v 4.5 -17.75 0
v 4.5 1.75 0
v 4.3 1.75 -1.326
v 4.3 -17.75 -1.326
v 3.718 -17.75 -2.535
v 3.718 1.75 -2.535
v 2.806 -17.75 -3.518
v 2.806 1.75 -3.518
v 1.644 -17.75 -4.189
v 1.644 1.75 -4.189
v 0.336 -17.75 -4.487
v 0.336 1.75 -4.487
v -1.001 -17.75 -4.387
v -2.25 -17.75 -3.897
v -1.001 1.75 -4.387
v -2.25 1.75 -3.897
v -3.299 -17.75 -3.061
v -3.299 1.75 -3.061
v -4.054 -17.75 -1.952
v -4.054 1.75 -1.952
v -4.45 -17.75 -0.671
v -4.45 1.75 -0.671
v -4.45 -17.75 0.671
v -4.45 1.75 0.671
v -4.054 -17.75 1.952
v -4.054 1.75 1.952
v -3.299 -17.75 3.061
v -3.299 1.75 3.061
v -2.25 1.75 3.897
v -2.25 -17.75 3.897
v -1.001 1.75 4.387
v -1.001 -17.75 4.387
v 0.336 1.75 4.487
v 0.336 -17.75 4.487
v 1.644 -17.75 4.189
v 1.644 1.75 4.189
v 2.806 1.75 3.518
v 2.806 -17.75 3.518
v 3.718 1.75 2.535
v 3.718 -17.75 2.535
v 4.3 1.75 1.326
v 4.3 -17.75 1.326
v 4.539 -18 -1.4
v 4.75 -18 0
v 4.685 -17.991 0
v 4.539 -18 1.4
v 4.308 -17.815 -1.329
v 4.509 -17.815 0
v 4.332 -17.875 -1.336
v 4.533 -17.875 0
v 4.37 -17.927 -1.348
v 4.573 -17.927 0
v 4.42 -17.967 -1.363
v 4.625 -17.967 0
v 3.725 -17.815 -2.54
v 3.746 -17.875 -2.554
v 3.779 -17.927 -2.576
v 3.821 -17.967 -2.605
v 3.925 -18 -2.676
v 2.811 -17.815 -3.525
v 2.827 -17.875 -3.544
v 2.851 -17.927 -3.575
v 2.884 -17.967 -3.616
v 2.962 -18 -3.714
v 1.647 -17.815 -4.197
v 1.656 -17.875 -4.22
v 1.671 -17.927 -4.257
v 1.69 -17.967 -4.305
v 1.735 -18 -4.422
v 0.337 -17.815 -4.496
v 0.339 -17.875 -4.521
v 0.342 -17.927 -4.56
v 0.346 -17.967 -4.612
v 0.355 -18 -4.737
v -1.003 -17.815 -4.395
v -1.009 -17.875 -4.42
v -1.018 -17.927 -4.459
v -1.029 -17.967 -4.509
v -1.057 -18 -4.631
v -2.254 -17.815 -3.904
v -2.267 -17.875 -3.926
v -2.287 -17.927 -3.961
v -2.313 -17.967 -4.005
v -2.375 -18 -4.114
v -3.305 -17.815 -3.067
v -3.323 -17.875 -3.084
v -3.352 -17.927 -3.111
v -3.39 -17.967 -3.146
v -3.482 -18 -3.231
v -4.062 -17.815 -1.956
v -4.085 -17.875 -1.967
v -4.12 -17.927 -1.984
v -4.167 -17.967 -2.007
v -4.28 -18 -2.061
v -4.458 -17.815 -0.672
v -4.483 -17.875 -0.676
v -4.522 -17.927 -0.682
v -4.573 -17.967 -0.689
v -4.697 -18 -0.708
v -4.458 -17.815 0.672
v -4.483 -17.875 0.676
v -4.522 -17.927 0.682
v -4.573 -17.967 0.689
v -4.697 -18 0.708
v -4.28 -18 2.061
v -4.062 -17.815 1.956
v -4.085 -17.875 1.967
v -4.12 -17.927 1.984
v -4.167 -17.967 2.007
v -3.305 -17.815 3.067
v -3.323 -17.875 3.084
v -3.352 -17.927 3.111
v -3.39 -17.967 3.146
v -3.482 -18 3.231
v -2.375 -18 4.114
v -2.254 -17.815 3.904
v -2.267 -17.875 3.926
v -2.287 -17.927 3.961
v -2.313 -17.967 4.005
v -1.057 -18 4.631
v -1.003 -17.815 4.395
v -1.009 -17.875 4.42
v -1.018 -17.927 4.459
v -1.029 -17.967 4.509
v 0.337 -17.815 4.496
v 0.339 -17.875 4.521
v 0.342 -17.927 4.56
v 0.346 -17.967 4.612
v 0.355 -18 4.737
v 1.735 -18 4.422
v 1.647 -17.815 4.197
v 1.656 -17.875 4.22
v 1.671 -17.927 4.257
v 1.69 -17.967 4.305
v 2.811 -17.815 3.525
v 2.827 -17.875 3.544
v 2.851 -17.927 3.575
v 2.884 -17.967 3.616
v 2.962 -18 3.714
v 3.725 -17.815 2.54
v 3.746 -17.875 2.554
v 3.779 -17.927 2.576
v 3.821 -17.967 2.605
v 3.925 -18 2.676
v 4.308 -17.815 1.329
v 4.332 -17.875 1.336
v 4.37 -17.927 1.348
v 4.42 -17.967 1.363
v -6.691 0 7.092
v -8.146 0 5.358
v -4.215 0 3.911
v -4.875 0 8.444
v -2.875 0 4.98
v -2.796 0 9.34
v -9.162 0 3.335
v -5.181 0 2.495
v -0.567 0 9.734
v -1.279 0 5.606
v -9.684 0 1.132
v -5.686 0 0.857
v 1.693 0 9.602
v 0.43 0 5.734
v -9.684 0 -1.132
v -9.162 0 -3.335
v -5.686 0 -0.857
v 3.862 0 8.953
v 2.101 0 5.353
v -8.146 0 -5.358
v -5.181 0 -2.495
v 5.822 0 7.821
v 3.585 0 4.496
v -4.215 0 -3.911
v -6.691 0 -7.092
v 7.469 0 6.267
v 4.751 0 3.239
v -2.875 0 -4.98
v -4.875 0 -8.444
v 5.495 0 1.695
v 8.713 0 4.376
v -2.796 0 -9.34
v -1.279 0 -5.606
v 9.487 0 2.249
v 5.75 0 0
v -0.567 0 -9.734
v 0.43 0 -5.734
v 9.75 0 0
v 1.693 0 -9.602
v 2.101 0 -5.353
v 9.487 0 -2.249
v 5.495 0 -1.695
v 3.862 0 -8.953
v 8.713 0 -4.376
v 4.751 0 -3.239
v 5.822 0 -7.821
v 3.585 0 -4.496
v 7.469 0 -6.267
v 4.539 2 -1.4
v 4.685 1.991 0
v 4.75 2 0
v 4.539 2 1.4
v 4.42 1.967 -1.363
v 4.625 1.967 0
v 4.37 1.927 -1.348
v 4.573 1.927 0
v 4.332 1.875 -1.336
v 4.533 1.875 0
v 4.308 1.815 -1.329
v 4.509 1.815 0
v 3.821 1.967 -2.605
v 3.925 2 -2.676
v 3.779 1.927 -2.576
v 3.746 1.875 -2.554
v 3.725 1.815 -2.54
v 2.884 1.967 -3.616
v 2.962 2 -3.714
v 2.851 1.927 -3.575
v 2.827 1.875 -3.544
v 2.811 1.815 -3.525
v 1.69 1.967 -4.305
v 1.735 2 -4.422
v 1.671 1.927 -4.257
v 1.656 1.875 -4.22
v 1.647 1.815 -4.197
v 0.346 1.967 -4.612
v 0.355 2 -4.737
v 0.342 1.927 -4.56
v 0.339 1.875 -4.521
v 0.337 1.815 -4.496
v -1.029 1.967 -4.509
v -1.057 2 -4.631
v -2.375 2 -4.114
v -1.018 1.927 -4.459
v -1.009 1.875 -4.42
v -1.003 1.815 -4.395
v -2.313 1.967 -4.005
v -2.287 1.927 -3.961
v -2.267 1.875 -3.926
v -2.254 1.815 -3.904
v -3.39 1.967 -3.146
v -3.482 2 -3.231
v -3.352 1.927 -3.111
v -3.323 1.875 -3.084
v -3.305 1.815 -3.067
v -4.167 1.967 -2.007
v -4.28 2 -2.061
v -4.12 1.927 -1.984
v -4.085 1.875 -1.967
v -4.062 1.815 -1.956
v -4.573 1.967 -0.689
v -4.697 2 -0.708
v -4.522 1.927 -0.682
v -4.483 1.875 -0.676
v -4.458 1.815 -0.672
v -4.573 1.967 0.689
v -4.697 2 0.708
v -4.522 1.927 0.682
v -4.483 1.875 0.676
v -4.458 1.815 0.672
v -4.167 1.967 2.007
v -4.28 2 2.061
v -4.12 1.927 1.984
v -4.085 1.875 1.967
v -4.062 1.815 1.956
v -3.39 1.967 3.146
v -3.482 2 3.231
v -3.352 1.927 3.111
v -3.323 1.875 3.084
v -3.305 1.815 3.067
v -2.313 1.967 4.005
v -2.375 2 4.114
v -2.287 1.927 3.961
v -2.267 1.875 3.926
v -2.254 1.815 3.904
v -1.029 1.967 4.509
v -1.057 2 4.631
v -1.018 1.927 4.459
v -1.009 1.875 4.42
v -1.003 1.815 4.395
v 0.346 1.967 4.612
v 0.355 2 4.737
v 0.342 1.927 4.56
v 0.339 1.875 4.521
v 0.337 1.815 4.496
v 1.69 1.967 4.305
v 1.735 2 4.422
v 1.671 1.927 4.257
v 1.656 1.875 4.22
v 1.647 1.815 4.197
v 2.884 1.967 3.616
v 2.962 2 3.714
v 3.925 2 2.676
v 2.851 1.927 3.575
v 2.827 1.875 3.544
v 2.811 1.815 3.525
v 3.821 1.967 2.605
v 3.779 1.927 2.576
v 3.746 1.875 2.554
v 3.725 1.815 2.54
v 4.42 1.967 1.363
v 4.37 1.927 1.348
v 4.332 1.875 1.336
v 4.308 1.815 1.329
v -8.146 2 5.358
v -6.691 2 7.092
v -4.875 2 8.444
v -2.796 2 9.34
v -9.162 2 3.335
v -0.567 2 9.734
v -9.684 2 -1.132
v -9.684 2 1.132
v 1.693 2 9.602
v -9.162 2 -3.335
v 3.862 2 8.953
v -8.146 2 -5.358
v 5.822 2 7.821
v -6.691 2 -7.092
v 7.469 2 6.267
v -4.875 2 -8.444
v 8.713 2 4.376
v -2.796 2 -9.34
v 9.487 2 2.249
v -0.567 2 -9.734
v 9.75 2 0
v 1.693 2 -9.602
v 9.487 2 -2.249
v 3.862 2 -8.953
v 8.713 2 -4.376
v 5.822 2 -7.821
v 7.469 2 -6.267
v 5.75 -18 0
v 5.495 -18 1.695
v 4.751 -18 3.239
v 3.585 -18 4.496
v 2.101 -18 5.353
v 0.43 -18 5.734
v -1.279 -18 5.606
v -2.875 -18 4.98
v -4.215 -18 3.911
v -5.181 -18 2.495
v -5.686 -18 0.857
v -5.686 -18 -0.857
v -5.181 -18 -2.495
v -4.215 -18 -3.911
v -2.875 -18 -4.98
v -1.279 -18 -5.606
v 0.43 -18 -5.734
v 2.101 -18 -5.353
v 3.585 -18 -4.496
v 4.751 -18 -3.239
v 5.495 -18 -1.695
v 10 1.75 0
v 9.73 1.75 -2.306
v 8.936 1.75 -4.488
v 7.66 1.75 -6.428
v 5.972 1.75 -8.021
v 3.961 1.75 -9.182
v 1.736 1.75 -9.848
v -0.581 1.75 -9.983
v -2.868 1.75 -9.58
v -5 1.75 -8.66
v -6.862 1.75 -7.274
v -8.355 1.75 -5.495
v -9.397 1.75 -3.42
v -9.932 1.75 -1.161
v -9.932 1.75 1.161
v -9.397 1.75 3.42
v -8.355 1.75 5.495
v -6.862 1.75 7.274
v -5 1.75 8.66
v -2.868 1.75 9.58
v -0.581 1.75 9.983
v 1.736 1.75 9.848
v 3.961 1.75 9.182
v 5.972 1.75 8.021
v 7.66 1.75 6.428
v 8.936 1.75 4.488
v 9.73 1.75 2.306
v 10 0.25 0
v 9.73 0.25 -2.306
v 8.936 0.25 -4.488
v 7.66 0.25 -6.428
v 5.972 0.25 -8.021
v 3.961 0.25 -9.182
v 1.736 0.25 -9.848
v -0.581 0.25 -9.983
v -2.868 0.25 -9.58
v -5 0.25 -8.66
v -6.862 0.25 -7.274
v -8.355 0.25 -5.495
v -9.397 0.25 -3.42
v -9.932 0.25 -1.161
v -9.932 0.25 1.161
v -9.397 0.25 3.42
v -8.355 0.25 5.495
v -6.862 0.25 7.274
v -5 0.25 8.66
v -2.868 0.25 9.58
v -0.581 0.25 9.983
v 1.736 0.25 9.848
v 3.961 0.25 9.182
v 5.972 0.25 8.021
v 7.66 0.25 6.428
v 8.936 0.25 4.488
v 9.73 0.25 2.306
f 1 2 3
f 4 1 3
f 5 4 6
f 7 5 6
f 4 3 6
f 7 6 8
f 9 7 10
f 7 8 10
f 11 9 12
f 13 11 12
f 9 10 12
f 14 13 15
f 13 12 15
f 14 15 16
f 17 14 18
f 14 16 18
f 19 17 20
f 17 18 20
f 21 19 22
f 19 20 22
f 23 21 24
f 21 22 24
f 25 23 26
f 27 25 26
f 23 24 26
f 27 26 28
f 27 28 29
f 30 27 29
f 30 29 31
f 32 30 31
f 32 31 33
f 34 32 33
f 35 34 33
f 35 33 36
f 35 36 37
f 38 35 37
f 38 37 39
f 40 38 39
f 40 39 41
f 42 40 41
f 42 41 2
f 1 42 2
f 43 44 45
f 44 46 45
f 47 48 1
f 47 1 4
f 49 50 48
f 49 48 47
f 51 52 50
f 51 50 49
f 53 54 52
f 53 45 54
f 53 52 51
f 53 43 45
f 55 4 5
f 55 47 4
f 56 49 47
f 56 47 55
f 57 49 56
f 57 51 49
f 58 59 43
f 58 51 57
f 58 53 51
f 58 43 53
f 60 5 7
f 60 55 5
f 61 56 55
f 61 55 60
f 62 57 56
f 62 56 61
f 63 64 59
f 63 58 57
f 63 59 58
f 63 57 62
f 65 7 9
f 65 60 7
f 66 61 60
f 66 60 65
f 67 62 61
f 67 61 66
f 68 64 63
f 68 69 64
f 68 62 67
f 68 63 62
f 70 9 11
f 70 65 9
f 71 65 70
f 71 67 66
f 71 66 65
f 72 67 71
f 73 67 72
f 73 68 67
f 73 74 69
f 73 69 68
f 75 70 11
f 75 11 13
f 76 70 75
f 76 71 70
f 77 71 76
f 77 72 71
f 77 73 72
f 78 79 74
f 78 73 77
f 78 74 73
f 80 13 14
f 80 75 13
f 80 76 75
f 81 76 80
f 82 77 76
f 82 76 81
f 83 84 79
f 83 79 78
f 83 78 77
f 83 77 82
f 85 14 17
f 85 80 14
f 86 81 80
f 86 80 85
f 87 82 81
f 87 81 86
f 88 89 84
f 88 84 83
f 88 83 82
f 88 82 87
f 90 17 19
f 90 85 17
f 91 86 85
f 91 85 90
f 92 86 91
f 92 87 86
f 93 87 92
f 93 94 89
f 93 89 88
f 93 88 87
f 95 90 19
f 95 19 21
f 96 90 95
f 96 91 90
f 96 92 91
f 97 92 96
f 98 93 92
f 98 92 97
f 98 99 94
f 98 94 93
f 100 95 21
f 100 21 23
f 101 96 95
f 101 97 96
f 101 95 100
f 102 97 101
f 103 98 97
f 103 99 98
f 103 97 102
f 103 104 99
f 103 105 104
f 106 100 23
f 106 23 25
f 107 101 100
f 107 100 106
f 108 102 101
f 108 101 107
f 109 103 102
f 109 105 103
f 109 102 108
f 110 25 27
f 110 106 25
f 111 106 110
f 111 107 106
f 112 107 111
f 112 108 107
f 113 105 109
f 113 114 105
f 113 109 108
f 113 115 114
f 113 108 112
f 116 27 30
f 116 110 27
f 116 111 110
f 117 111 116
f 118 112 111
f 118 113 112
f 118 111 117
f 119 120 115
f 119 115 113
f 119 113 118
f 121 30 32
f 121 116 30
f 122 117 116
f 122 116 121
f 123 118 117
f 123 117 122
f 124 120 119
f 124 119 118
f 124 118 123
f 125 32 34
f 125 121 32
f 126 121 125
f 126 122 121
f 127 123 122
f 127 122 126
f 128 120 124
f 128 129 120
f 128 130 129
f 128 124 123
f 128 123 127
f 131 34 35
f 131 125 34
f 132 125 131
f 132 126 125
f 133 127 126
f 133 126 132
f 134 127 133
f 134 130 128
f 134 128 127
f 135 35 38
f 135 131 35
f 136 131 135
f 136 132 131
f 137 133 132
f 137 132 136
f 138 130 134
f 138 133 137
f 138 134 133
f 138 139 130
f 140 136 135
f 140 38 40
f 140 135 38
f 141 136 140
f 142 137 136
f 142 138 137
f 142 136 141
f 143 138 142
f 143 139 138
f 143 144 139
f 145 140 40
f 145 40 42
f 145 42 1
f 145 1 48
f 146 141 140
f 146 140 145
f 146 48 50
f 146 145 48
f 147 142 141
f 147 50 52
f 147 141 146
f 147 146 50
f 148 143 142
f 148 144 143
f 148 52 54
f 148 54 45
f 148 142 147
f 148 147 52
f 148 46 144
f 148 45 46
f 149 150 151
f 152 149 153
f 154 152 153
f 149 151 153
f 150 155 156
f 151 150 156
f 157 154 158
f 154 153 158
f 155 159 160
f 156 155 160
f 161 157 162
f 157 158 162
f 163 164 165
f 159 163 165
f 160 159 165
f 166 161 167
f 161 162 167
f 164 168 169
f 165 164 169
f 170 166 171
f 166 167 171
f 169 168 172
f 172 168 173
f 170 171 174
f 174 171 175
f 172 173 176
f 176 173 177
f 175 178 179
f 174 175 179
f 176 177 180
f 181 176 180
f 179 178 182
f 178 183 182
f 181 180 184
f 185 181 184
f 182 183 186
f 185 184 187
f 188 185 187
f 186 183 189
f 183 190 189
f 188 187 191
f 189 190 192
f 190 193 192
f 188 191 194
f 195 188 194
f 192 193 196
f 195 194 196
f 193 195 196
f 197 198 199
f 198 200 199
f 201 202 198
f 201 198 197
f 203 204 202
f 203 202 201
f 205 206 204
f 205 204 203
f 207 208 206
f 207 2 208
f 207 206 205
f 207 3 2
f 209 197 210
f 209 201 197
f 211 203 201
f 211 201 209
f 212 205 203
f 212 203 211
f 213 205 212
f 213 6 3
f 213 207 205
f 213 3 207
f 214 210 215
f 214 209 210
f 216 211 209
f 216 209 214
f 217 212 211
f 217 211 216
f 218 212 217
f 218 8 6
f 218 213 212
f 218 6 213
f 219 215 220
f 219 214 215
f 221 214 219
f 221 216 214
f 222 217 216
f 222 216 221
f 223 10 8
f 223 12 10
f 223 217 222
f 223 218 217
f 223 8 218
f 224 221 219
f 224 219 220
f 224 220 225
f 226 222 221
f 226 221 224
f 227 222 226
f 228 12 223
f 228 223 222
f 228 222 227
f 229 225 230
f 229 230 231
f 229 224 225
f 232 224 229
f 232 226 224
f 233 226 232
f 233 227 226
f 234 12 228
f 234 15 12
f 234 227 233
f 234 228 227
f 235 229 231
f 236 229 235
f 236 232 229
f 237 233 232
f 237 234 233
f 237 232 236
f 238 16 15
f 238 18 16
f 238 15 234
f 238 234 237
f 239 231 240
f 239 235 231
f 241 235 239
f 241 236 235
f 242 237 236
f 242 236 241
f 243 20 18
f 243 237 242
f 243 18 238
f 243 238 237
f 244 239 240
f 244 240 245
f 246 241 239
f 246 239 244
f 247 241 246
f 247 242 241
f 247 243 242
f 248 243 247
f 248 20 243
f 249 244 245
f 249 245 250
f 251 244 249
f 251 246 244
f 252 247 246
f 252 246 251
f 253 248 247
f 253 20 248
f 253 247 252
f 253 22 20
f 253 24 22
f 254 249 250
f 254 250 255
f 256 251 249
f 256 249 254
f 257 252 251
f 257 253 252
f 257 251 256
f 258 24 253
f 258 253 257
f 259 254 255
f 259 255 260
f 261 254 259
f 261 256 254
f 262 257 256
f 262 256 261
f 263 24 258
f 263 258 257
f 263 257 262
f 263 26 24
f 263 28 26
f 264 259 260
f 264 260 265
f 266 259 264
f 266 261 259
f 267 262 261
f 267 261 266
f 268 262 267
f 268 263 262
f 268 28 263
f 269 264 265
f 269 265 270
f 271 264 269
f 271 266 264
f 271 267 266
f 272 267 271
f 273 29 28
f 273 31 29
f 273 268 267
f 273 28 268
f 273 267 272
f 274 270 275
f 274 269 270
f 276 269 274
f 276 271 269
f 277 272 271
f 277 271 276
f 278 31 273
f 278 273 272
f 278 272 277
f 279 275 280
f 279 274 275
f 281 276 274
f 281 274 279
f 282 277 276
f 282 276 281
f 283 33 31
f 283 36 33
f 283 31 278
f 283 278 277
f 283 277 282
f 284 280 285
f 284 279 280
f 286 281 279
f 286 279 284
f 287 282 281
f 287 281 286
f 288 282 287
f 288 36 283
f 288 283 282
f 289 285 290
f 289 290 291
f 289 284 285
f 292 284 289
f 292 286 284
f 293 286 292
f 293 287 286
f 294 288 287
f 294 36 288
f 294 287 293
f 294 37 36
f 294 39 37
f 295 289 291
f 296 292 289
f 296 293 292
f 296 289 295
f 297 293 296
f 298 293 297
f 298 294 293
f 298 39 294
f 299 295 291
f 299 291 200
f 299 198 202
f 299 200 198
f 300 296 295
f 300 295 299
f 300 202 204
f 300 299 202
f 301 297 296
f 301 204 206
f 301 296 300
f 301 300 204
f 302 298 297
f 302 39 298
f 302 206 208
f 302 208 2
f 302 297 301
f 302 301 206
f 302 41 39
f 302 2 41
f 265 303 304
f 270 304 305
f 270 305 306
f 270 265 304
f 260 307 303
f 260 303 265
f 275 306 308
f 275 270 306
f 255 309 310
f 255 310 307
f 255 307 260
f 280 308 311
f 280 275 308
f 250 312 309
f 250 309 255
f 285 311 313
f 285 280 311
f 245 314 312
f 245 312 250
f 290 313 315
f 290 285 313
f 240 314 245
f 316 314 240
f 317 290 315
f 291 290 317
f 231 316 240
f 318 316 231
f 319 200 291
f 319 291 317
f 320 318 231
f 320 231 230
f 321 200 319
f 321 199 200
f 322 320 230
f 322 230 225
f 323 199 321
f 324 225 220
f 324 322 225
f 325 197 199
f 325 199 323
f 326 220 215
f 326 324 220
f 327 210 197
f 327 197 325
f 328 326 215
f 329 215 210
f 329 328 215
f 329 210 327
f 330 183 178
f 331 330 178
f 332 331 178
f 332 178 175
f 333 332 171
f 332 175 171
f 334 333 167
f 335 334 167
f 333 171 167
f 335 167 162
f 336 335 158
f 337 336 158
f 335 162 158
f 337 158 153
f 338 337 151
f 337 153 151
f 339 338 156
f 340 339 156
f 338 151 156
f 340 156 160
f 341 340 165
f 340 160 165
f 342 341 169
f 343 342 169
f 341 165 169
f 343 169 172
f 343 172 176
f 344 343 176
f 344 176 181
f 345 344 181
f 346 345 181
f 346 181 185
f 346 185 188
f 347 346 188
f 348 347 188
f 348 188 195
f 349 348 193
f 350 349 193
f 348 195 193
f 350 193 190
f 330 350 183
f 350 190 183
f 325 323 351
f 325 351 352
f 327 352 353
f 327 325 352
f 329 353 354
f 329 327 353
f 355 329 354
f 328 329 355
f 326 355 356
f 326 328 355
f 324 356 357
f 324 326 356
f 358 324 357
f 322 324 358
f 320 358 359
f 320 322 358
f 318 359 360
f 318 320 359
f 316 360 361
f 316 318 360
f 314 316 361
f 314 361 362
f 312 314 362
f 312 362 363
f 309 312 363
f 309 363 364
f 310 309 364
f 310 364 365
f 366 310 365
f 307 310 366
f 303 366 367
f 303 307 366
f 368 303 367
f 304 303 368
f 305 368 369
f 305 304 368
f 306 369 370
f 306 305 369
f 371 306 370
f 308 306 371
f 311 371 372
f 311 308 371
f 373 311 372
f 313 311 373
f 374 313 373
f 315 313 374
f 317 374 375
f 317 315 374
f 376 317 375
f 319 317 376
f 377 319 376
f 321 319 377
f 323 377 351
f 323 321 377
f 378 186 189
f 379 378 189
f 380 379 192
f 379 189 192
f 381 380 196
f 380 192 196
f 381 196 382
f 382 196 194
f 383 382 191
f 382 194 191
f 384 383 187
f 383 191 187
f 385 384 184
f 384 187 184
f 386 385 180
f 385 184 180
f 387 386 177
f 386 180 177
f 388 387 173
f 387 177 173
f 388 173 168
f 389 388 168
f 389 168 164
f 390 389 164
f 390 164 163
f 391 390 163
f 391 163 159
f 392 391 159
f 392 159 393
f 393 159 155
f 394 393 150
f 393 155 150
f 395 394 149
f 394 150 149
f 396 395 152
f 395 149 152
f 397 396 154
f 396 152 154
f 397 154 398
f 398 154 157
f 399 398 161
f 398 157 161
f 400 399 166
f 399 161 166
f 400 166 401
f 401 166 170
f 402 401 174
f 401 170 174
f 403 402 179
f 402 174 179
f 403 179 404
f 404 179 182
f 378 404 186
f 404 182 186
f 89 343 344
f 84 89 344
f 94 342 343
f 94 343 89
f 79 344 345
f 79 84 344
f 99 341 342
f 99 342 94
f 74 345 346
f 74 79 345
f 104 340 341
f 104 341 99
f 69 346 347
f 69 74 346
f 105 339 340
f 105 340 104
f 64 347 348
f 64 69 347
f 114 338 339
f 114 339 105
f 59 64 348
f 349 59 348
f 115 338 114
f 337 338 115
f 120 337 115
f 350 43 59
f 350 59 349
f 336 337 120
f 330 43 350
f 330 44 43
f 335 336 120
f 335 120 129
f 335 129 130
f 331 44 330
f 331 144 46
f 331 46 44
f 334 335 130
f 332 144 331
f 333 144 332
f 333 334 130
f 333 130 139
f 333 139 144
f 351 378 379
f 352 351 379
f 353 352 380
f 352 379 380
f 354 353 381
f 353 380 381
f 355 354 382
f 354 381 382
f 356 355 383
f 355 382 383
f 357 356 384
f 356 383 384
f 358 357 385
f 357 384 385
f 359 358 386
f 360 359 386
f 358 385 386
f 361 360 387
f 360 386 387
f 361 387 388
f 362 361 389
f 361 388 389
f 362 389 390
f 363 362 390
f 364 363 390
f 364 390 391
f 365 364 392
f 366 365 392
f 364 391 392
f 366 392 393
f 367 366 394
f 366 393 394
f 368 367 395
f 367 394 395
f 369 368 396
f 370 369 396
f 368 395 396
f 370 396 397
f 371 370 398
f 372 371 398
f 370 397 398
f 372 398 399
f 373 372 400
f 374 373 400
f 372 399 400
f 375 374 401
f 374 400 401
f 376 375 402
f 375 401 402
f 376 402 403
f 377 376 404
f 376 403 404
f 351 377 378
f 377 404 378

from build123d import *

# Parameters (mm, degrees)
SKETCH_1_R          = 10
EXTRUDE_1_DEPTH     = 2
SKETCH_2_R          = 5.75
EXTRUDE_2_DEPTH     = 18
CUT_EXTRUDE_1_REACH = 22
SKETCH_3_R          = 4.5
CHAMFER_1_SIZE      = 0.25
FILLET_1_R          = 0.25


with BuildPart() as part:
    # ｽｹｯﾁ1 → ﾎﾞｽ - 押し出し1 (new body)
    with BuildSketch(Plane(origin=(0, 0, 0), x_dir=(1, 0, 0), z_dir=(0, 1, 0))):
        Circle(SKETCH_1_R)
    extrude(amount=EXTRUDE_1_DEPTH)

    # ｽｹｯﾁ2 → ﾎﾞｽ - 押し出し2 (add)
    with BuildSketch(Plane.XZ):
        Circle(SKETCH_2_R)
    extrude(amount=EXTRUDE_2_DEPTH)

    # ｽｹｯﾁ3 → ｶｯﾄ - 押し出し1 (cut, up to next)
    with BuildSketch(Plane(origin=(0, 2, 0), x_dir=(1, 0, 0), z_dir=(0, 1, 0)), mode=Mode.PRIVATE) as cut_extrude_1_sk1:
        Circle(SKETCH_3_R)
    cut_extrude_1_tool1 = extrude(cut_extrude_1_sk1.sketch, amount=-CUT_EXTRUDE_1_REACH, mode=Mode.PRIVATE) & part.part
    add(cut_extrude_1_tool1.solids().sort_by_distance((0, 2, 0))[0], mode=Mode.SUBTRACT)

    # 面取り1
    chamfer_1_edges = [part.edges().sort_by_distance(p)[0] for p in [
        (-10, 0, 0),
        (-10, 2, 0),
    ]]
    chamfer(chamfer_1_edges, length=CHAMFER_1_SIZE)

    # ﾌｨﾚｯﾄ1
    fillet_1_edges = [part.edges().sort_by_distance(p)[0] for p in [
        (-4.5, -18, 0),
        (-4.5, 2, 0),
    ]]
    fillet(fillet_1_edges, radius=FILLET_1_R)


solid = part.part
